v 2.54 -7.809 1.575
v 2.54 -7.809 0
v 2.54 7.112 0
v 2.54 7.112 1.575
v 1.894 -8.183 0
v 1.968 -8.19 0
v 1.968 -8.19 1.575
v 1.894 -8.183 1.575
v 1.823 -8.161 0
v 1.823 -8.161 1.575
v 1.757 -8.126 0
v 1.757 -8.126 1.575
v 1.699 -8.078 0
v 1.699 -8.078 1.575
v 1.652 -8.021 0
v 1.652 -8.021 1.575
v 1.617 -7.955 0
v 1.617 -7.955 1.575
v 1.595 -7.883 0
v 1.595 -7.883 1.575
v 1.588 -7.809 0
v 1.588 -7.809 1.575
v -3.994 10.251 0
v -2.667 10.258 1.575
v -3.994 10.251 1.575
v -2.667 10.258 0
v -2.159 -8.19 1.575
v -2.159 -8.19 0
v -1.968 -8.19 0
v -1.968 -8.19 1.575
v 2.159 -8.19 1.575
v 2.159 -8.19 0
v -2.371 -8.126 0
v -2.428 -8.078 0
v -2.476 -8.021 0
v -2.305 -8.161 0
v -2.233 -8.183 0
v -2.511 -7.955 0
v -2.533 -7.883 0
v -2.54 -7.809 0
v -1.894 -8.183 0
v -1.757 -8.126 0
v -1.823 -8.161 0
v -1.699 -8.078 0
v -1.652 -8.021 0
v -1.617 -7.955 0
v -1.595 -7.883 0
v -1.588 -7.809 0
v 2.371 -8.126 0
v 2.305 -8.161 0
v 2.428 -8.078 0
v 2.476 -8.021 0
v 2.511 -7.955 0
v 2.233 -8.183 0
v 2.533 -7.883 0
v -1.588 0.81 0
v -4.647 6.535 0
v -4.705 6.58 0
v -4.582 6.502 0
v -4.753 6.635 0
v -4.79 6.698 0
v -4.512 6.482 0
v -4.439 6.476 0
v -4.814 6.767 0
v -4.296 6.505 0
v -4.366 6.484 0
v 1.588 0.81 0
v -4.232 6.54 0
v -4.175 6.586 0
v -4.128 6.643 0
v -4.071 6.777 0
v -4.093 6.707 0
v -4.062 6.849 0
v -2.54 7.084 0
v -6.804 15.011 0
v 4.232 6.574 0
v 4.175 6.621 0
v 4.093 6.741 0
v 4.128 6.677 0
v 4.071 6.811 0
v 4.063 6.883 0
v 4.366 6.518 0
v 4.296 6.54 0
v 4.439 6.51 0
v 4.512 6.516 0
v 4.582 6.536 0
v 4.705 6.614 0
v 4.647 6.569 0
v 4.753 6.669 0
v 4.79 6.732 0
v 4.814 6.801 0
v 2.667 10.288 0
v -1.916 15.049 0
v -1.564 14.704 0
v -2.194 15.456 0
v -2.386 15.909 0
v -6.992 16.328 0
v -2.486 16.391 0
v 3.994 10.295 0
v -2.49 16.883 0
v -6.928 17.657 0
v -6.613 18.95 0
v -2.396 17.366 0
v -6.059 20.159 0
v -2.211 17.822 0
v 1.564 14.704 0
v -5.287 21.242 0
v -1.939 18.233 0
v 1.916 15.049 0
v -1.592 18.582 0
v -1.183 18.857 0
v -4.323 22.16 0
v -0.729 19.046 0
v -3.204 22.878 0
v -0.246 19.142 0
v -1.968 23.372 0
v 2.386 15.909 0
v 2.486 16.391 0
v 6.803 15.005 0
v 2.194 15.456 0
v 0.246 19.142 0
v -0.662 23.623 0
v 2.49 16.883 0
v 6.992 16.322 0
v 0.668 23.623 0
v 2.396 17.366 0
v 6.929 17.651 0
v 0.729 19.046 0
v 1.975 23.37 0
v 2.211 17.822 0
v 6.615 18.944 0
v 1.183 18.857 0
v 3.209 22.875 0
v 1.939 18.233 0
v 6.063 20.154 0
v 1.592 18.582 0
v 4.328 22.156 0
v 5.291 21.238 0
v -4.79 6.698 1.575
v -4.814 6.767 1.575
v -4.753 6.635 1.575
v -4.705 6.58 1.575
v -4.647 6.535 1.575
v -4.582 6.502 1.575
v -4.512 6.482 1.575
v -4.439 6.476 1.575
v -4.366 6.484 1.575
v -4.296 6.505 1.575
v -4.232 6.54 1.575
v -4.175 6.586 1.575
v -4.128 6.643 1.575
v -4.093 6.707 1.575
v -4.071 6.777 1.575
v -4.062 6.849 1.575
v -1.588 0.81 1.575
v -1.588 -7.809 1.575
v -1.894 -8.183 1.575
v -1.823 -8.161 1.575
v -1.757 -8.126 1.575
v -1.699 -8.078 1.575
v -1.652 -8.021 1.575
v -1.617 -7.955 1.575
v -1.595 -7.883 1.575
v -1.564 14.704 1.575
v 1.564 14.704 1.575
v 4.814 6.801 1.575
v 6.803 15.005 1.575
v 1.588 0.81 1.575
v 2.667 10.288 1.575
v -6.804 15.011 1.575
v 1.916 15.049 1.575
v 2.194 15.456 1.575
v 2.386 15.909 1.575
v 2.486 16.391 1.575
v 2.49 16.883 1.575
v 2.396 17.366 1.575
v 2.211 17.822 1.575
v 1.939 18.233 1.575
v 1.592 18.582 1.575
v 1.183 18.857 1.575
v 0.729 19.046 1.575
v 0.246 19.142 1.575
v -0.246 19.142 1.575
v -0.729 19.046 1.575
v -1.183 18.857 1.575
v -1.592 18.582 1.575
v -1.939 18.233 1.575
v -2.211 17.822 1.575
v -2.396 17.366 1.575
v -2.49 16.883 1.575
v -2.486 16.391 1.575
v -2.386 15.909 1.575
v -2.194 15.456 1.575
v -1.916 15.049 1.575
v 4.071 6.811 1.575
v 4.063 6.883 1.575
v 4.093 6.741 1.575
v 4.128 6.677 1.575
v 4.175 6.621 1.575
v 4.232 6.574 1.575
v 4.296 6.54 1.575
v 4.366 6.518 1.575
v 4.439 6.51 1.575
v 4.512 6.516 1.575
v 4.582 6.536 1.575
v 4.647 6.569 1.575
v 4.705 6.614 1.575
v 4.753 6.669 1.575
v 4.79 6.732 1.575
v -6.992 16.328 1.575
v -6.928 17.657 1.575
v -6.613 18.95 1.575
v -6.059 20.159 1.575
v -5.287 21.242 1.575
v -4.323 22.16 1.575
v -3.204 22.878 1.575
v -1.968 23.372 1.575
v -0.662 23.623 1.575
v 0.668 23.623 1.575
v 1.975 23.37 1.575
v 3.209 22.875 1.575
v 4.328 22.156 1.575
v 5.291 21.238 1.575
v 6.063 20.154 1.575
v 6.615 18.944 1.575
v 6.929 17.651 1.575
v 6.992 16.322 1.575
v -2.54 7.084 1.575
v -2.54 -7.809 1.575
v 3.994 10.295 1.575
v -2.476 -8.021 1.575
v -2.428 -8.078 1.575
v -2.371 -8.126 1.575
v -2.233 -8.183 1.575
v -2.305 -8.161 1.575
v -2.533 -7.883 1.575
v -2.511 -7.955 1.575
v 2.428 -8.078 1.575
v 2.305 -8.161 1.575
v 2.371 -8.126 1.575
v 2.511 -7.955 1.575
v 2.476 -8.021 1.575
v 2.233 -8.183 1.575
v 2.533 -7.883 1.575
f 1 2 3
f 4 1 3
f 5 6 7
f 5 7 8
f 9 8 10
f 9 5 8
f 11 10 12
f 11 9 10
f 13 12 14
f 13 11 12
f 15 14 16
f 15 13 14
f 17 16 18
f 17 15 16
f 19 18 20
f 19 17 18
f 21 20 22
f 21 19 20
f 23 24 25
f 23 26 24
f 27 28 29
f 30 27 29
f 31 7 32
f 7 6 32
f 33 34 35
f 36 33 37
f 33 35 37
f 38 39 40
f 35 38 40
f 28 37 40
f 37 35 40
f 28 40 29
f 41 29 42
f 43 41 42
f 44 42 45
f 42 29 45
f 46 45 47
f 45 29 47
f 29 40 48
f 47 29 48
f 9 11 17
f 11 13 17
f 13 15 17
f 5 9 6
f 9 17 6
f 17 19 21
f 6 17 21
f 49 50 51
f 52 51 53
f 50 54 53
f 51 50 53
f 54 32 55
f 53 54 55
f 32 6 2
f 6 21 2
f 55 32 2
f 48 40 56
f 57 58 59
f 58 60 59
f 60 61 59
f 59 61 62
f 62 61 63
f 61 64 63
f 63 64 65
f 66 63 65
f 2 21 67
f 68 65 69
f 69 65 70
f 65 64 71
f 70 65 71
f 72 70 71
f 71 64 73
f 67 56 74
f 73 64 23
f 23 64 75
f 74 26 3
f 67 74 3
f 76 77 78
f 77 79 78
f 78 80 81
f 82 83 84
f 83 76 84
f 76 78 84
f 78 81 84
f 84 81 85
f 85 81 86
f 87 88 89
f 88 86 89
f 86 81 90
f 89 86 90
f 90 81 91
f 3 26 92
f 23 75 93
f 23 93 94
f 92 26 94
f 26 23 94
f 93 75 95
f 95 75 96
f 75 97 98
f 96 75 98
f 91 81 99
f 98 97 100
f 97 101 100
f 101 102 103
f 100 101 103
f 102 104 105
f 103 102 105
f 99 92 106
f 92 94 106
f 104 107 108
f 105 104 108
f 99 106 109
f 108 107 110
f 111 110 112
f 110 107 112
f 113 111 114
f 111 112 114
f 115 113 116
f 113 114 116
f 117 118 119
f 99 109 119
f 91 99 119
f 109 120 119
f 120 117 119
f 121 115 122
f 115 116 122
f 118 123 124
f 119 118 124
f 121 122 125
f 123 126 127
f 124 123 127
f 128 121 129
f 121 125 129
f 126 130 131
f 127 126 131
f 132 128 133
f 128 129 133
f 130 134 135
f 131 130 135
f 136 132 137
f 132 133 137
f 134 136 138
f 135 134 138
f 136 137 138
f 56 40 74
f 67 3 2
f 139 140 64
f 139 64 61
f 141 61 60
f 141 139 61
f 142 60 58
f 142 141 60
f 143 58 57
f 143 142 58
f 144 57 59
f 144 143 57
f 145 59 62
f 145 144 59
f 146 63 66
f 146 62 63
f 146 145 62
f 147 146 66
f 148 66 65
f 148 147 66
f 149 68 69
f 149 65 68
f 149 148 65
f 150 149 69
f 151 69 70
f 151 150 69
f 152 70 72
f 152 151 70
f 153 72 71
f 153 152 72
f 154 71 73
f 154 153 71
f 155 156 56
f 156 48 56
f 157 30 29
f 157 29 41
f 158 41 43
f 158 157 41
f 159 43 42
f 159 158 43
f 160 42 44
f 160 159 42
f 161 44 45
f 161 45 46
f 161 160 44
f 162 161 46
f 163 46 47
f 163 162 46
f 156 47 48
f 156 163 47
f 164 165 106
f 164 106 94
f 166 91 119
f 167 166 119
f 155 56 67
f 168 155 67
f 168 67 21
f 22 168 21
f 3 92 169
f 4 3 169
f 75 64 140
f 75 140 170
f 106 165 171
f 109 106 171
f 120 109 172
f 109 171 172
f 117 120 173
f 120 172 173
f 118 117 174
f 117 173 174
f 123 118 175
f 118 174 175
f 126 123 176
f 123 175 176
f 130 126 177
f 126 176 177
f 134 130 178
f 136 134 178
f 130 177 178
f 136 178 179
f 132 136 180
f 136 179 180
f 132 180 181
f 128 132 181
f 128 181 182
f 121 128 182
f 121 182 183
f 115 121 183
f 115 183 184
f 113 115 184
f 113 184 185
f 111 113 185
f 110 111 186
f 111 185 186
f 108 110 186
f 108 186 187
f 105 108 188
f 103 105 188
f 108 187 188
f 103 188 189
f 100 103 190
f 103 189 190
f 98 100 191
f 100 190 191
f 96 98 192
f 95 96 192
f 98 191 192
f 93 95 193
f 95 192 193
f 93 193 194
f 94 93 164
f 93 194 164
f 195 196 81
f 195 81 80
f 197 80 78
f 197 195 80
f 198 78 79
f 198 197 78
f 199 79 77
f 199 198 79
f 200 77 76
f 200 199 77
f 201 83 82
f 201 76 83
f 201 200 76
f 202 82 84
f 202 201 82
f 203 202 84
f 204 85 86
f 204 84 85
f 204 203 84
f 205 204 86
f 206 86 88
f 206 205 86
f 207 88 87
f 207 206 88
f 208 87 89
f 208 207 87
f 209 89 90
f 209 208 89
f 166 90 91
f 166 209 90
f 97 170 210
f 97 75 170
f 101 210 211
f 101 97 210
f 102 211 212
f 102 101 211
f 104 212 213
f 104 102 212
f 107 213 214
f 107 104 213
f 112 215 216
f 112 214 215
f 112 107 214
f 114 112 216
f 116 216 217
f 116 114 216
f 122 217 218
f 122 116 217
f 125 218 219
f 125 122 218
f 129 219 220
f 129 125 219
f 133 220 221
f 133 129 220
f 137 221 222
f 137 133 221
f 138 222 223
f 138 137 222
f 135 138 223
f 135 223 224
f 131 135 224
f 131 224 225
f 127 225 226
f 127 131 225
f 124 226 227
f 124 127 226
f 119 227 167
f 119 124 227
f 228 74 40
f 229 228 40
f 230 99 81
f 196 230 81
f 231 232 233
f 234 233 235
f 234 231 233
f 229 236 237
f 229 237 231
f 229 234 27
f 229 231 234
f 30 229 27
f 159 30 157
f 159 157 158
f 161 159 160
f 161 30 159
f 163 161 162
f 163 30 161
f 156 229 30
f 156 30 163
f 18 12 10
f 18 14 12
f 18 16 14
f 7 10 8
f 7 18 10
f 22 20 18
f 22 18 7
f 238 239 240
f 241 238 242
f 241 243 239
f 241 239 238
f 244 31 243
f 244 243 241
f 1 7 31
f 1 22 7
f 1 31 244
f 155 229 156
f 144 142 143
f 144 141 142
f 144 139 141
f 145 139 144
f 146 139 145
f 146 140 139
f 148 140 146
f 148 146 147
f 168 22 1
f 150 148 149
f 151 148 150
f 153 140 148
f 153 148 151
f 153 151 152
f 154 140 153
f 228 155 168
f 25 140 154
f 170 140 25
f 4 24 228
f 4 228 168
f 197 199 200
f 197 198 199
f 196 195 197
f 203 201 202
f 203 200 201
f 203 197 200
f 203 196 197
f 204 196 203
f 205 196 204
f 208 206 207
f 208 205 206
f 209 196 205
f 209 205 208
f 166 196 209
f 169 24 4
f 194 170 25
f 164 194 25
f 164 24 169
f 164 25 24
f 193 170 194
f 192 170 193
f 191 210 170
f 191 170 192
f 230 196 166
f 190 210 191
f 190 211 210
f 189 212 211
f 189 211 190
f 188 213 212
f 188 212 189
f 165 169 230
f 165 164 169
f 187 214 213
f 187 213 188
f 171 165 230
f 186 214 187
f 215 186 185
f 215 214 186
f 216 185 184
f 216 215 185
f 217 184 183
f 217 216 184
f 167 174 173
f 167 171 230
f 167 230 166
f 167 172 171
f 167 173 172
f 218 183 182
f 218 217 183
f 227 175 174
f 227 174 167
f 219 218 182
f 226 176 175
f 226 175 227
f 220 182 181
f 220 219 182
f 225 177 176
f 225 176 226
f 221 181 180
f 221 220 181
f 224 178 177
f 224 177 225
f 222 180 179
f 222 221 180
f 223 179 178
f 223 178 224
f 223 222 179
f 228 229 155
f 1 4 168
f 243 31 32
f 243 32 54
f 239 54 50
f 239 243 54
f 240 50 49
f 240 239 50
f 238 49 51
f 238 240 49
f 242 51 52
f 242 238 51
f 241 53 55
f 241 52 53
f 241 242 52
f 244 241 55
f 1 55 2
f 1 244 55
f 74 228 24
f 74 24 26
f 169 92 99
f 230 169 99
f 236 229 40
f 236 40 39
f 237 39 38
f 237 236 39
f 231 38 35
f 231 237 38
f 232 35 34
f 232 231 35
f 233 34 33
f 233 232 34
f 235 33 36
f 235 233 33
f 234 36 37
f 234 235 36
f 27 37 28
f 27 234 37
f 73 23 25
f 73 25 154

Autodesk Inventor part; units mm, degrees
ref_plane "YZ Plane" through (0, 0, 0) normal (1, 0, 0) x (0, 1, 0)
ref_plane "XZ Plane" through (0, 0, 0) normal (0, 1, 0) x (-1, 0, 0)
ref_plane "XY Plane" through (0, 0, 0) normal (0, 0, 1) x (1, 0, 0)
sketch "Sketch1" plane through (0, 0, 0) normal (0, 0, 1) x (1, 0, 0)
  line L0 (-2.54, -8.19) -> (2.54, -8.19)
  line L1 (2.54, -8.19) -> (2.54, 8.19)
  line L2 (-2.54, 8.19) -> (-2.54, -8.19)
  line L3 (-2.54, -8.19) -> (2.54, 8.19) construction
  line L4 (2.54, -8.19) -> (-2.54, 8.19) construction
  circle A0 centre (0, 16.6545) radius 2.5 construction
  circle A1 centre (0, 16.6545) radius 5
  arc A2 (6.8029, 15.0051) -> (-6.8044, 15.0114) centre (0, 16.6545) ccw
  line L5 (-2.54, 8.19) -> (-2.54, 10.2591)
  line L6 (2.54, 8.19) -> (2.54, 10.2869)
  line L7 (0, 0) -> (0, 10.7842) construction
  line L8 (-2.54, 10.2591) -> (-3.9944, 10.2511)
  line L9 (2.54, 10.2869) -> (3.9944, 10.2948)
  line L10 (-3.9944, 10.2511) -> (-4.1214, 3.9003)
  line L11 (3.9944, 10.2948) -> (4.1214, 3.9454)
  line L12 (-4.1214, 3.9003) -> (-6.8044, 15.0114)
  line L13 (4.1214, 3.9454) -> (6.8029, 15.0051)
  line L14 (0, 0) -> (0, 22.9511) construction
  point P0 (-3.2672, 10.2551)
  dimension "d2" = 5
  dimension "d3" = 10
  dimension "d4" = 14
  dimension "d8" = 1.5815
  dimension "d9" = 1.5815
  dimension "d10" = 6.35
  dimension "d11" = 6.35
  dimension "d18" = 1.4545
  dimension "d19" = 1.4545
  dimension "d31" = 2.54
  dimension "d32" = 2.54
  dimension "d33" = 0
extrude "Plate1" add sketch "Sketch1" along normal blind 1.5748
sketch "Sketch2" plane through (0, 0, 0) normal (0, 0, -1) x (-1, 0, 0)
  circle A0 centre (0, 16.6545) radius 5 projected
  line L0 (-3.9944, 10.2948) -> (-4.1214, 3.9454) projected
  line L1 (-2.54, 10.2869) -> (-3.9944, 10.2948) projected
  line L2 (-2.54, -8.19) -> (-2.54, 10.2869) projected
  line L3 (2.54, -8.19) -> (-2.54, -8.19) projected
  line L4 (2.54, 10.2591) -> (2.54, -8.19) projected
  line L5 (3.9944, 10.2511) -> (2.54, 10.2591) projected
  line L6 (4.1214, 3.9003) -> (3.9944, 10.2511) projected
  line L7 (6.8044, 15.0114) -> (4.1214, 3.9003) projected
  arc A1 (6.8044, 15.0114) -> (-6.8029, 15.0051) centre (0, 16.6545) ccw projected
  line L8 (-4.1214, 3.9454) -> (-6.8029, 15.0051) projected
  line L9 (-1.5875, -17.19) -> (1.5875, -17.19)
  line L10 (1.5875, -17.19) -> (1.5875, 0.81)
  line L11 (1.5875, 0.81) -> (-1.5875, 0.81)
  line L12 (-1.5875, 0.81) -> (-1.5875, -17.19)
  line L13 (-1.5875, -17.19) -> (1.5875, 0.81) construction
  line L14 (1.5875, -17.19) -> (-1.5875, 0.81) construction
  point P0 (0, 0)
  point P1 (0, -8.19)
  dimension "d14" = 3.175
extrude "Extrusion1" cut sketch "Sketch2" against normal blind 25.4 contours L12 L11 L10 L3 | L3 L10 L9 L12
sketch "Sketch3" plane through (0, 0, 1.5748) normal (0, 0, 1) x (1, 0, 0)
  circle A0 centre (-37.757, 0) radius 3
  line L0 (-39.3445, -2.5456) -> (-36.1695, -2.5456)
  line L1 (-36.1695, -2.5456) -> (-36.1695, 2.5456)
  line L2 (-36.1695, 2.5456) -> (-39.3445, 2.5456)
  line L3 (-39.3445, 2.5456) -> (-39.3445, -2.5456)
  line L4 (-39.3445, -2.5456) -> (-36.1695, 2.5456) construction
  line L5 (-36.1695, -2.5456) -> (-39.3445, 2.5456) construction
  circle A1 centre (-37.757, 0) radius 4
  point P0 (0, 0)
  point P1 (-37.757, 3)
  point P2 (-37.757, 4)
  dimension "d35" = 8
  dimension "d28" = 6
  dimension "d29" = 3.175
  dimension "d30" = 5.0911
  dimension "d34" = 0.4545
  dimension "d36" = 1.4545
fillet "Fillet4" radius 0.381 6 edges at (-4.1214, 3.9003, 0.7874) (4.1214, 3.9454, 0.7874) (-2.54, -8.19, 0.7874) (-1.5875, -8.19, 0.7874) (1.5875, -8.19, 0.7874) (2.54, -8.19, 0.7874)
sketch "Sketch4" plane through (0, 0, 1.5748) normal (0, 0, 1) x (1, 0, 0)
  arc A0 (2.159, -8.19) -> (2.54, -7.809) centre (2.159, -7.809) ccw projected
  line L0 (2.54, 10.2869) -> (2.54, -7.809) projected
  line L1 (3.9944, 10.2948) -> (2.54, 10.2869) projected
  line L2 (4.0627, 6.8835) -> (3.9944, 10.2948) projected
  arc A1 (4.0627, 6.8835) -> (4.8139, 6.8013) centre (4.4436, 6.8911) ccw projected
  line L3 (6.8029, 15.0051) -> (4.8139, 6.8013) projected
  arc A2 (6.8029, 15.0051) -> (-6.8044, 15.0114) centre (0, 16.6545) ccw projected
  line L4 (-4.8137, 6.7674) -> (-6.8044, 15.0114) projected
  arc A3 (-4.8137, 6.7674) -> (-4.0625, 6.8492) centre (-4.4434, 6.8568) ccw projected
  line L5 (-3.9944, 10.2511) -> (-4.0625, 6.8492) projected
  line L6 (-2.54, 10.2591) -> (-3.9944, 10.2511) projected
  line L7 (-2.54, -7.809) -> (-2.54, 10.2591) projected
  arc A4 (-2.54, -7.809) -> (-2.159, -8.19) centre (-2.159, -7.809) ccw projected
  line L8 (-1.9685, -8.19) -> (-2.159, -8.19) projected
  arc A5 (-1.9685, -8.19) -> (-1.5875, -7.809) centre (-1.9685, -7.809) ccw projected
  line L9 (-1.5875, -7.809) -> (-1.5875, 0.81) projected
  line L10 (-1.5875, 0.81) -> (1.5875, 0.81) projected
  line L11 (1.5875, 0.81) -> (1.5875, -7.809) projected
  arc A6 (1.5875, -7.809) -> (1.9685, -8.19) centre (1.9685, -7.809) ccw projected
  line L12 (2.159, -8.19) -> (1.9685, -8.19) projected
  circle A7 centre (0, 16.6545) radius 5 projected
  point P0 (0, 0)
extrude "Extrusion2" add sketch "Sketch4" against normal up to surface (1.5748 mm away) contours A7
sketch "Sketch5" plane through (0, 0, 1.5748) normal (0, 0, 1) x (1, 0, 0)
  arc A0 (2.159, -8.19) -> (2.54, -7.809) centre (2.159, -7.809) ccw projected
  line L0 (2.54, 10.2869) -> (2.54, -7.809) projected
  line L1 (3.9944, 10.2948) -> (2.54, 10.2869) projected
  line L2 (4.0627, 6.8835) -> (3.9944, 10.2948) projected
  arc A1 (4.0627, 6.8835) -> (4.8139, 6.8013) centre (4.4436, 6.8911) ccw projected
  line L3 (6.8029, 15.0051) -> (4.8139, 6.8013) projected
  arc A2 (6.8029, 15.0051) -> (-6.8044, 15.0114) centre (0, 16.6545) ccw projected
  line L4 (-4.8137, 6.7674) -> (-6.8044, 15.0114) projected
  arc A3 (-4.8137, 6.7674) -> (-4.0625, 6.8492) centre (-4.4434, 6.8568) ccw projected
  line L5 (-3.9944, 10.2511) -> (-4.0625, 6.8492) projected
  line L6 (-2.54, 10.2591) -> (-3.9944, 10.2511) projected
  line L7 (-2.54, -7.809) -> (-2.54, 10.2591) projected
  arc A4 (-2.54, -7.809) -> (-2.159, -8.19) centre (-2.159, -7.809) ccw projected
  line L8 (-1.9685, -8.19) -> (-2.159, -8.19) projected
  arc A5 (-1.9685, -8.19) -> (-1.5875, -7.809) centre (-1.9685, -7.809) ccw projected
  line L9 (-1.5875, -7.809) -> (-1.5875, 0.81) projected
  line L10 (-1.5875, 0.81) -> (1.5875, 0.81) projected
  line L11 (1.5875, 0.81) -> (1.5875, -7.809) projected
  arc A6 (1.5875, -7.809) -> (1.9685, -8.19) centre (1.9685, -7.809) ccw projected
  line L12 (2.159, -8.19) -> (1.9685, -8.19) projected
  arc A7 (1.5644, 14.7045) -> (-1.5644, 14.7045) centre (0, 16.6545) ccw
  line L13 (1.5644, 14.7045) -> (-1.5644, 14.7045)
  point P0 (0, 0)
  point P1 (0, 19.1545)
  dimension "d40" = 5
  dimension "d44" = 4.45
extrude "Extrusion3" cut sketch "Sketch5" against normal blind 25.4 contours L13 A7
chamfer "Chamfer3" distance 0.127 distance2 3.175 1 edges at (-2.54, 10.2591, 0.7874) measured on face at (-3.5096, 10.2538, 0.5249)
chamfer "Chamfer4" distance 3.175 distance2 0.127 1 edges at (2.54, 10.2869, 0.7874) measured on face at (2.54, -1.7771, 1.0499)
equation "\"d18\" = d36"
equation "\"d19\" = d36"
equation "\"BendRadius\" = Thickness"
equation "\"BendReliefWidth\" = Thickness"
equation "\"BendReliefDepth\" = 0.5 * Thickness"
equation "\"CornerReliefSize\" = 4 * Thickness"
equation "\"MinimumRemnant\" = 2 * Thickness"
equation "\"TransitionRadius\" = BendRadius"
equation "\"JacobiRadiusSize\" = BendRadius"
equation "\"GapSize\" = Thickness"
equation "\"d12\" = BendRadius"
equation "\"Thickness\" = 1.5748"
properties part number "8mm OD 6mm ID Rod End125Motor"
